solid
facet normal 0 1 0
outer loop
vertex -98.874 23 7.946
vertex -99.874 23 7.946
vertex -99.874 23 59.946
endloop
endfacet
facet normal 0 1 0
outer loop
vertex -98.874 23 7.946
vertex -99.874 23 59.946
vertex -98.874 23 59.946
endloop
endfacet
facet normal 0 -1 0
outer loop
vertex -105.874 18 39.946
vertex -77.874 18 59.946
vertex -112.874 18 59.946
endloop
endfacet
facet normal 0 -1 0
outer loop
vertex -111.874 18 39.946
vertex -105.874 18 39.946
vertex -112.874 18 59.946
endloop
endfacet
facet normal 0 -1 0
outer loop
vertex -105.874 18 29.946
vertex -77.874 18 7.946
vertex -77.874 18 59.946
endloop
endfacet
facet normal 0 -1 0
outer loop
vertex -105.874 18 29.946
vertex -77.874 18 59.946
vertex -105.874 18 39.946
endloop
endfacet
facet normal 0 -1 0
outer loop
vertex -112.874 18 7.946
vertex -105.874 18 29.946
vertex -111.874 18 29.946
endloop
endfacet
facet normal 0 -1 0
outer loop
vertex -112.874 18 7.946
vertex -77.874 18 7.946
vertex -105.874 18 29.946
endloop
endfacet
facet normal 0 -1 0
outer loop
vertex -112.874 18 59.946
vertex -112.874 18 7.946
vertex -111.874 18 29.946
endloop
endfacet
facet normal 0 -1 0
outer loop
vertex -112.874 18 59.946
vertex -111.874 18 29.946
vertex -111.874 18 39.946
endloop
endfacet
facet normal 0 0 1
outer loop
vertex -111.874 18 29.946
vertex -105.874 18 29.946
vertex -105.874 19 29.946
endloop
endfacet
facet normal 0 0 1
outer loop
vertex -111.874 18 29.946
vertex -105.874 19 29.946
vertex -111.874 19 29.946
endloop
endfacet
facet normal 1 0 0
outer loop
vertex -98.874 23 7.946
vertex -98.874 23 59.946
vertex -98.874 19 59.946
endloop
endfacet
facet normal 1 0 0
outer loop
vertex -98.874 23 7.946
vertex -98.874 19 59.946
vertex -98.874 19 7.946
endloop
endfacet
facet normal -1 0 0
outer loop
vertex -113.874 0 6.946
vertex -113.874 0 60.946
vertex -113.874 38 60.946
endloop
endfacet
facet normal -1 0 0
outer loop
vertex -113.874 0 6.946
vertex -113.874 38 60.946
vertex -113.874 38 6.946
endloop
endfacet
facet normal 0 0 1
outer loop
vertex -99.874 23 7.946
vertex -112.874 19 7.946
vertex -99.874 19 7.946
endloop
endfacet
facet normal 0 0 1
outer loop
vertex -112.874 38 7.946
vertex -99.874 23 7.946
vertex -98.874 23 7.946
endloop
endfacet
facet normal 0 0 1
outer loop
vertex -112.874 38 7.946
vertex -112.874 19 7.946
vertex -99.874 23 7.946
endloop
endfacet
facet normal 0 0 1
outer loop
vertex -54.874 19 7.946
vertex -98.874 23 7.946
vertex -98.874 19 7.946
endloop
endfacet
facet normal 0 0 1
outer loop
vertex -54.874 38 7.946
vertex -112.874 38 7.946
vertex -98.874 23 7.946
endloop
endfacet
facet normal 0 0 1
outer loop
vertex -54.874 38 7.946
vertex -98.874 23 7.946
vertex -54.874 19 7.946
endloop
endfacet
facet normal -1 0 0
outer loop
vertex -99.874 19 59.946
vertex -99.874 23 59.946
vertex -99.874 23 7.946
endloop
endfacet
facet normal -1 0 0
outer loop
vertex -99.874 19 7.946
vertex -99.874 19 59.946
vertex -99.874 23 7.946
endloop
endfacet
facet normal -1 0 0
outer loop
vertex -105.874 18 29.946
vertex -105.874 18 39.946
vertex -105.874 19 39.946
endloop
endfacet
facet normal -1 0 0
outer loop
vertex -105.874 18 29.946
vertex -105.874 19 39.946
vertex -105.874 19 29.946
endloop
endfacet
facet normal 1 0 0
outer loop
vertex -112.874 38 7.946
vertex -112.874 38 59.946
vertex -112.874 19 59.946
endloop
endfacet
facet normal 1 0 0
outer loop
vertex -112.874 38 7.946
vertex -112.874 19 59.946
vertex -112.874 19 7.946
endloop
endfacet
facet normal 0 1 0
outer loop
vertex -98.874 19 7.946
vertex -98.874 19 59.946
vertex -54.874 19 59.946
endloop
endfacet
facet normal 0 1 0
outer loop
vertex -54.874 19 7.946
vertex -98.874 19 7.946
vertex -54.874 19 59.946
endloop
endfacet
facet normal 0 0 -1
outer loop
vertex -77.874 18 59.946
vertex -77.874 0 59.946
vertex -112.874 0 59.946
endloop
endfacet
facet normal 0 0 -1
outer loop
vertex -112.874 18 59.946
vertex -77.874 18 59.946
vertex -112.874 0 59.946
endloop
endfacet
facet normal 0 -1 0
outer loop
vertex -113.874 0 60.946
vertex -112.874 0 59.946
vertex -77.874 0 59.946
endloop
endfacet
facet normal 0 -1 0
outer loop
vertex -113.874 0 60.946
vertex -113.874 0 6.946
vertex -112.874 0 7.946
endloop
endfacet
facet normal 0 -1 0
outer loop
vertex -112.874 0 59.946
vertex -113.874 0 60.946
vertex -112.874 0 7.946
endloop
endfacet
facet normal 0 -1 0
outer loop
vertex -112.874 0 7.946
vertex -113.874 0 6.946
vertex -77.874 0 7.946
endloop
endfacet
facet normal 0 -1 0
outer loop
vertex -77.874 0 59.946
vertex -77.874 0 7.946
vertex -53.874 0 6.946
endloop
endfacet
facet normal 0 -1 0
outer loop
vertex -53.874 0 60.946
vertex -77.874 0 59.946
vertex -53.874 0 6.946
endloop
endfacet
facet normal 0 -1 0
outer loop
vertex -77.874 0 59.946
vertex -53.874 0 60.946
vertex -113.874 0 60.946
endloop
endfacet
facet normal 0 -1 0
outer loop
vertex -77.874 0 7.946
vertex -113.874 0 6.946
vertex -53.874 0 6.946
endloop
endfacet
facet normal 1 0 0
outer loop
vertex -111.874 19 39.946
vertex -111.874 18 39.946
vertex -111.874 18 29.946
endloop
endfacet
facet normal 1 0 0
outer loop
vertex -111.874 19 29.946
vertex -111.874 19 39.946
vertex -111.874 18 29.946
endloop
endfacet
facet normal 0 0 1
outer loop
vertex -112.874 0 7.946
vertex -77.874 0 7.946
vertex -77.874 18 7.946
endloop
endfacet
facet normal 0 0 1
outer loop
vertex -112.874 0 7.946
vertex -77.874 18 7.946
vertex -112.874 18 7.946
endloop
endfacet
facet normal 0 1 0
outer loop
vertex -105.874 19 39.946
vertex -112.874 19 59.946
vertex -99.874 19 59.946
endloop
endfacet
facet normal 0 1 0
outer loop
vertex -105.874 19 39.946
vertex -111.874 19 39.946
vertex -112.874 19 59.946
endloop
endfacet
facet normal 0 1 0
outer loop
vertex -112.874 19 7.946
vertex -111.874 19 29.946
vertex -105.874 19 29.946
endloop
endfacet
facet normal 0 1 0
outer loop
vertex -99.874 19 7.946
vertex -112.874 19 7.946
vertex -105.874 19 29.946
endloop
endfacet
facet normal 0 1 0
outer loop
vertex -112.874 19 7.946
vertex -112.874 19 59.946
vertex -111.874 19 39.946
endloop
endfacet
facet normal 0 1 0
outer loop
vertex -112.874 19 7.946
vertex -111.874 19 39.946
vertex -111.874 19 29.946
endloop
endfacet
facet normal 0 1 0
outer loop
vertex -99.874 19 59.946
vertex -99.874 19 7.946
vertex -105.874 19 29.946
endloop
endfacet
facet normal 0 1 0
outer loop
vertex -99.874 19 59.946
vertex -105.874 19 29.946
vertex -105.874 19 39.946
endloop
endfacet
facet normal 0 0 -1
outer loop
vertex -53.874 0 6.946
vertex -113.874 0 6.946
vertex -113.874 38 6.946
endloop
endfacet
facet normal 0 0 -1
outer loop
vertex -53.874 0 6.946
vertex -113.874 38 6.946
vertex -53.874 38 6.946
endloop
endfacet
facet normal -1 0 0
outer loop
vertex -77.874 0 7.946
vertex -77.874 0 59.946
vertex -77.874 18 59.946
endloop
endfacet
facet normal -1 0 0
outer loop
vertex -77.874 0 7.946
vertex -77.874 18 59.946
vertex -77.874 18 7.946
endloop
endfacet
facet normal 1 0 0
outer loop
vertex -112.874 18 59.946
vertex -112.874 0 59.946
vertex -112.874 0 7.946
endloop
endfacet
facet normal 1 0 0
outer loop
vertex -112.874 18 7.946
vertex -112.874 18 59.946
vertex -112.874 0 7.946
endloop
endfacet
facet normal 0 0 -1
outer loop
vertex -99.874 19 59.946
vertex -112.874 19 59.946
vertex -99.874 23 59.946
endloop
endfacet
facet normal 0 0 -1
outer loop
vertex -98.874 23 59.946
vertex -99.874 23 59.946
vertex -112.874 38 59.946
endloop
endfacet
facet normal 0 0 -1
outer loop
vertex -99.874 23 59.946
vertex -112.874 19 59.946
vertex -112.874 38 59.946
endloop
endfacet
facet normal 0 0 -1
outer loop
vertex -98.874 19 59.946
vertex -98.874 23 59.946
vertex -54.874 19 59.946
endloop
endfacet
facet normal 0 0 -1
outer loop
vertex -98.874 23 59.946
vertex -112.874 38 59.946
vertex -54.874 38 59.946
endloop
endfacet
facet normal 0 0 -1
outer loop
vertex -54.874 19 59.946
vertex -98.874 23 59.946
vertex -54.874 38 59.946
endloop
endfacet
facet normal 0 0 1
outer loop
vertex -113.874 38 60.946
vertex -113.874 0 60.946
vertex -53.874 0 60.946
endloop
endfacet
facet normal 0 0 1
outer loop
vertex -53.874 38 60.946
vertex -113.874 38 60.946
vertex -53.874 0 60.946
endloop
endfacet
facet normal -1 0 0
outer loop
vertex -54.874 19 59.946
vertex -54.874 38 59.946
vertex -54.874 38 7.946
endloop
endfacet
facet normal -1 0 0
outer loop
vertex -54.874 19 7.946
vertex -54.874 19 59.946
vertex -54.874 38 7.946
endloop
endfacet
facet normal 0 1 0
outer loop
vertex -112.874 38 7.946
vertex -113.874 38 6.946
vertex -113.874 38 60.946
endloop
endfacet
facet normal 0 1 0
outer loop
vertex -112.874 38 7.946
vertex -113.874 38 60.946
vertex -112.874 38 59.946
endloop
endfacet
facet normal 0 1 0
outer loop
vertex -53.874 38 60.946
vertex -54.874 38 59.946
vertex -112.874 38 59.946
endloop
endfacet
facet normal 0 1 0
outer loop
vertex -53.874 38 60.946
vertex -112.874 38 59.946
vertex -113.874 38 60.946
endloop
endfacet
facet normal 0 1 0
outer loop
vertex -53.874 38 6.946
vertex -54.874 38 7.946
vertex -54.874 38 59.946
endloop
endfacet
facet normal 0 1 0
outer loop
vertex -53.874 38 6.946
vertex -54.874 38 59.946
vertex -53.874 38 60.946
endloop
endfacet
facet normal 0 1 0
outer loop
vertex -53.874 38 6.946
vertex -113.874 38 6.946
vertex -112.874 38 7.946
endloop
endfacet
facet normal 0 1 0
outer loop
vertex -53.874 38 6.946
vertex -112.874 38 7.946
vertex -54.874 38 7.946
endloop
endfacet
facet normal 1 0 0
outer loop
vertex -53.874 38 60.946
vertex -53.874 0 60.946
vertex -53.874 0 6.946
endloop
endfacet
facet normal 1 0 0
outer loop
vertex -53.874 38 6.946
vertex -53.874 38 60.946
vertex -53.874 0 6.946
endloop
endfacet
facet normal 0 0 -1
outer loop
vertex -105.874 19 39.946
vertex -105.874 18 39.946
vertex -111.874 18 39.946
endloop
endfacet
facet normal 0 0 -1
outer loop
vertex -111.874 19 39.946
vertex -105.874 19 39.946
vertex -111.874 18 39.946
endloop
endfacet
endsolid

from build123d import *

# Parameters (mm, degrees)
SKETCH1_W           = 60
SKETCH1_H           = 54
BOSS_EXTRUDE1_DEPTH = 38
SKETCH2_W           = 44
SKETCH2_H           = 52
CUT_EXTRUDE1_DEPTH  = 19
SKETCH3_W           = 35
SKETCH3_H           = 52
CUT_EXTRUDE2_DEPTH  = 18
SKETCH4_W           = 6
SKETCH4_H           = 10
CUT_EXTRUDE3_DEPTH  = 38
SKETCH5_W           = 14
SKETCH5_H           = 52
CUT_EXTRUDE5_DEPTH  = 15
SKETCH6_W           = 13
SKETCH6_H           = 52
CUT_EXTRUDE6_DEPTH  = 4


with BuildPart() as part:
    # Sketch1 → Boss-Extrude1 (new body)
    with BuildSketch(Plane(origin=(0, 0, 0), x_dir=(1, 0, 0), z_dir=(0, 1, 0))):
        with Locations((-83.874465942, -33.946435202)):
            Rectangle(SKETCH1_W, SKETCH1_H)
    extrude(amount=BOSS_EXTRUDE1_DEPTH)

    # Sketch2 → Cut-Extrude1 (cut)
    with BuildSketch(Plane(origin=(0, 38, 0), x_dir=(1, 0, 0), z_dir=(0, 1, 0))):
        with Locations((-76.874465942, -33.946435202)):
            Rectangle(SKETCH2_W, SKETCH2_H)
    extrude(amount=-CUT_EXTRUDE1_DEPTH, mode=Mode.SUBTRACT)

    # Sketch3 → Cut-Extrude2 (cut)
    with BuildSketch(Plane(origin=(0, 0, 0), x_dir=(-1, 0, 0), z_dir=(0, -1, 0))):
        with Locations((95.374465942, -33.946435202)):
            Rectangle(SKETCH3_W, SKETCH3_H)
    extrude(amount=-CUT_EXTRUDE2_DEPTH, mode=Mode.SUBTRACT)

    # Sketch4 → Cut-Extrude3 (cut)
    with BuildSketch(Plane(origin=(0, 18, 0), x_dir=(-1, 0, 0), z_dir=(0, -1, 0))):
        with Locations((108.874465942, -34.946435202)):
            Rectangle(SKETCH4_W, SKETCH4_H)
    extrude(amount=-CUT_EXTRUDE3_DEPTH, mode=Mode.SUBTRACT)

    # Sketch5 → Cut-Extrude5 (cut)
    with BuildSketch(Plane(origin=(0, 38, 0), x_dir=(1, 0, 0), z_dir=(0, 1, 0))):
        with Locations((-105.874465942, -33.946435202)):
            Rectangle(SKETCH5_W, SKETCH5_H)
    extrude(amount=-CUT_EXTRUDE5_DEPTH, mode=Mode.SUBTRACT)

    # Sketch6 → Cut-Extrude6 (cut)
    with BuildSketch(Plane(origin=(0, 23, 0), x_dir=(1, 0, 0), z_dir=(0, 1, 0))):
        with Locations((-106.374465942, -33.946435202)):
            Rectangle(SKETCH6_W, SKETCH6_H)
    extrude(amount=-CUT_EXTRUDE6_DEPTH, mode=Mode.SUBTRACT)


solid = part.part
